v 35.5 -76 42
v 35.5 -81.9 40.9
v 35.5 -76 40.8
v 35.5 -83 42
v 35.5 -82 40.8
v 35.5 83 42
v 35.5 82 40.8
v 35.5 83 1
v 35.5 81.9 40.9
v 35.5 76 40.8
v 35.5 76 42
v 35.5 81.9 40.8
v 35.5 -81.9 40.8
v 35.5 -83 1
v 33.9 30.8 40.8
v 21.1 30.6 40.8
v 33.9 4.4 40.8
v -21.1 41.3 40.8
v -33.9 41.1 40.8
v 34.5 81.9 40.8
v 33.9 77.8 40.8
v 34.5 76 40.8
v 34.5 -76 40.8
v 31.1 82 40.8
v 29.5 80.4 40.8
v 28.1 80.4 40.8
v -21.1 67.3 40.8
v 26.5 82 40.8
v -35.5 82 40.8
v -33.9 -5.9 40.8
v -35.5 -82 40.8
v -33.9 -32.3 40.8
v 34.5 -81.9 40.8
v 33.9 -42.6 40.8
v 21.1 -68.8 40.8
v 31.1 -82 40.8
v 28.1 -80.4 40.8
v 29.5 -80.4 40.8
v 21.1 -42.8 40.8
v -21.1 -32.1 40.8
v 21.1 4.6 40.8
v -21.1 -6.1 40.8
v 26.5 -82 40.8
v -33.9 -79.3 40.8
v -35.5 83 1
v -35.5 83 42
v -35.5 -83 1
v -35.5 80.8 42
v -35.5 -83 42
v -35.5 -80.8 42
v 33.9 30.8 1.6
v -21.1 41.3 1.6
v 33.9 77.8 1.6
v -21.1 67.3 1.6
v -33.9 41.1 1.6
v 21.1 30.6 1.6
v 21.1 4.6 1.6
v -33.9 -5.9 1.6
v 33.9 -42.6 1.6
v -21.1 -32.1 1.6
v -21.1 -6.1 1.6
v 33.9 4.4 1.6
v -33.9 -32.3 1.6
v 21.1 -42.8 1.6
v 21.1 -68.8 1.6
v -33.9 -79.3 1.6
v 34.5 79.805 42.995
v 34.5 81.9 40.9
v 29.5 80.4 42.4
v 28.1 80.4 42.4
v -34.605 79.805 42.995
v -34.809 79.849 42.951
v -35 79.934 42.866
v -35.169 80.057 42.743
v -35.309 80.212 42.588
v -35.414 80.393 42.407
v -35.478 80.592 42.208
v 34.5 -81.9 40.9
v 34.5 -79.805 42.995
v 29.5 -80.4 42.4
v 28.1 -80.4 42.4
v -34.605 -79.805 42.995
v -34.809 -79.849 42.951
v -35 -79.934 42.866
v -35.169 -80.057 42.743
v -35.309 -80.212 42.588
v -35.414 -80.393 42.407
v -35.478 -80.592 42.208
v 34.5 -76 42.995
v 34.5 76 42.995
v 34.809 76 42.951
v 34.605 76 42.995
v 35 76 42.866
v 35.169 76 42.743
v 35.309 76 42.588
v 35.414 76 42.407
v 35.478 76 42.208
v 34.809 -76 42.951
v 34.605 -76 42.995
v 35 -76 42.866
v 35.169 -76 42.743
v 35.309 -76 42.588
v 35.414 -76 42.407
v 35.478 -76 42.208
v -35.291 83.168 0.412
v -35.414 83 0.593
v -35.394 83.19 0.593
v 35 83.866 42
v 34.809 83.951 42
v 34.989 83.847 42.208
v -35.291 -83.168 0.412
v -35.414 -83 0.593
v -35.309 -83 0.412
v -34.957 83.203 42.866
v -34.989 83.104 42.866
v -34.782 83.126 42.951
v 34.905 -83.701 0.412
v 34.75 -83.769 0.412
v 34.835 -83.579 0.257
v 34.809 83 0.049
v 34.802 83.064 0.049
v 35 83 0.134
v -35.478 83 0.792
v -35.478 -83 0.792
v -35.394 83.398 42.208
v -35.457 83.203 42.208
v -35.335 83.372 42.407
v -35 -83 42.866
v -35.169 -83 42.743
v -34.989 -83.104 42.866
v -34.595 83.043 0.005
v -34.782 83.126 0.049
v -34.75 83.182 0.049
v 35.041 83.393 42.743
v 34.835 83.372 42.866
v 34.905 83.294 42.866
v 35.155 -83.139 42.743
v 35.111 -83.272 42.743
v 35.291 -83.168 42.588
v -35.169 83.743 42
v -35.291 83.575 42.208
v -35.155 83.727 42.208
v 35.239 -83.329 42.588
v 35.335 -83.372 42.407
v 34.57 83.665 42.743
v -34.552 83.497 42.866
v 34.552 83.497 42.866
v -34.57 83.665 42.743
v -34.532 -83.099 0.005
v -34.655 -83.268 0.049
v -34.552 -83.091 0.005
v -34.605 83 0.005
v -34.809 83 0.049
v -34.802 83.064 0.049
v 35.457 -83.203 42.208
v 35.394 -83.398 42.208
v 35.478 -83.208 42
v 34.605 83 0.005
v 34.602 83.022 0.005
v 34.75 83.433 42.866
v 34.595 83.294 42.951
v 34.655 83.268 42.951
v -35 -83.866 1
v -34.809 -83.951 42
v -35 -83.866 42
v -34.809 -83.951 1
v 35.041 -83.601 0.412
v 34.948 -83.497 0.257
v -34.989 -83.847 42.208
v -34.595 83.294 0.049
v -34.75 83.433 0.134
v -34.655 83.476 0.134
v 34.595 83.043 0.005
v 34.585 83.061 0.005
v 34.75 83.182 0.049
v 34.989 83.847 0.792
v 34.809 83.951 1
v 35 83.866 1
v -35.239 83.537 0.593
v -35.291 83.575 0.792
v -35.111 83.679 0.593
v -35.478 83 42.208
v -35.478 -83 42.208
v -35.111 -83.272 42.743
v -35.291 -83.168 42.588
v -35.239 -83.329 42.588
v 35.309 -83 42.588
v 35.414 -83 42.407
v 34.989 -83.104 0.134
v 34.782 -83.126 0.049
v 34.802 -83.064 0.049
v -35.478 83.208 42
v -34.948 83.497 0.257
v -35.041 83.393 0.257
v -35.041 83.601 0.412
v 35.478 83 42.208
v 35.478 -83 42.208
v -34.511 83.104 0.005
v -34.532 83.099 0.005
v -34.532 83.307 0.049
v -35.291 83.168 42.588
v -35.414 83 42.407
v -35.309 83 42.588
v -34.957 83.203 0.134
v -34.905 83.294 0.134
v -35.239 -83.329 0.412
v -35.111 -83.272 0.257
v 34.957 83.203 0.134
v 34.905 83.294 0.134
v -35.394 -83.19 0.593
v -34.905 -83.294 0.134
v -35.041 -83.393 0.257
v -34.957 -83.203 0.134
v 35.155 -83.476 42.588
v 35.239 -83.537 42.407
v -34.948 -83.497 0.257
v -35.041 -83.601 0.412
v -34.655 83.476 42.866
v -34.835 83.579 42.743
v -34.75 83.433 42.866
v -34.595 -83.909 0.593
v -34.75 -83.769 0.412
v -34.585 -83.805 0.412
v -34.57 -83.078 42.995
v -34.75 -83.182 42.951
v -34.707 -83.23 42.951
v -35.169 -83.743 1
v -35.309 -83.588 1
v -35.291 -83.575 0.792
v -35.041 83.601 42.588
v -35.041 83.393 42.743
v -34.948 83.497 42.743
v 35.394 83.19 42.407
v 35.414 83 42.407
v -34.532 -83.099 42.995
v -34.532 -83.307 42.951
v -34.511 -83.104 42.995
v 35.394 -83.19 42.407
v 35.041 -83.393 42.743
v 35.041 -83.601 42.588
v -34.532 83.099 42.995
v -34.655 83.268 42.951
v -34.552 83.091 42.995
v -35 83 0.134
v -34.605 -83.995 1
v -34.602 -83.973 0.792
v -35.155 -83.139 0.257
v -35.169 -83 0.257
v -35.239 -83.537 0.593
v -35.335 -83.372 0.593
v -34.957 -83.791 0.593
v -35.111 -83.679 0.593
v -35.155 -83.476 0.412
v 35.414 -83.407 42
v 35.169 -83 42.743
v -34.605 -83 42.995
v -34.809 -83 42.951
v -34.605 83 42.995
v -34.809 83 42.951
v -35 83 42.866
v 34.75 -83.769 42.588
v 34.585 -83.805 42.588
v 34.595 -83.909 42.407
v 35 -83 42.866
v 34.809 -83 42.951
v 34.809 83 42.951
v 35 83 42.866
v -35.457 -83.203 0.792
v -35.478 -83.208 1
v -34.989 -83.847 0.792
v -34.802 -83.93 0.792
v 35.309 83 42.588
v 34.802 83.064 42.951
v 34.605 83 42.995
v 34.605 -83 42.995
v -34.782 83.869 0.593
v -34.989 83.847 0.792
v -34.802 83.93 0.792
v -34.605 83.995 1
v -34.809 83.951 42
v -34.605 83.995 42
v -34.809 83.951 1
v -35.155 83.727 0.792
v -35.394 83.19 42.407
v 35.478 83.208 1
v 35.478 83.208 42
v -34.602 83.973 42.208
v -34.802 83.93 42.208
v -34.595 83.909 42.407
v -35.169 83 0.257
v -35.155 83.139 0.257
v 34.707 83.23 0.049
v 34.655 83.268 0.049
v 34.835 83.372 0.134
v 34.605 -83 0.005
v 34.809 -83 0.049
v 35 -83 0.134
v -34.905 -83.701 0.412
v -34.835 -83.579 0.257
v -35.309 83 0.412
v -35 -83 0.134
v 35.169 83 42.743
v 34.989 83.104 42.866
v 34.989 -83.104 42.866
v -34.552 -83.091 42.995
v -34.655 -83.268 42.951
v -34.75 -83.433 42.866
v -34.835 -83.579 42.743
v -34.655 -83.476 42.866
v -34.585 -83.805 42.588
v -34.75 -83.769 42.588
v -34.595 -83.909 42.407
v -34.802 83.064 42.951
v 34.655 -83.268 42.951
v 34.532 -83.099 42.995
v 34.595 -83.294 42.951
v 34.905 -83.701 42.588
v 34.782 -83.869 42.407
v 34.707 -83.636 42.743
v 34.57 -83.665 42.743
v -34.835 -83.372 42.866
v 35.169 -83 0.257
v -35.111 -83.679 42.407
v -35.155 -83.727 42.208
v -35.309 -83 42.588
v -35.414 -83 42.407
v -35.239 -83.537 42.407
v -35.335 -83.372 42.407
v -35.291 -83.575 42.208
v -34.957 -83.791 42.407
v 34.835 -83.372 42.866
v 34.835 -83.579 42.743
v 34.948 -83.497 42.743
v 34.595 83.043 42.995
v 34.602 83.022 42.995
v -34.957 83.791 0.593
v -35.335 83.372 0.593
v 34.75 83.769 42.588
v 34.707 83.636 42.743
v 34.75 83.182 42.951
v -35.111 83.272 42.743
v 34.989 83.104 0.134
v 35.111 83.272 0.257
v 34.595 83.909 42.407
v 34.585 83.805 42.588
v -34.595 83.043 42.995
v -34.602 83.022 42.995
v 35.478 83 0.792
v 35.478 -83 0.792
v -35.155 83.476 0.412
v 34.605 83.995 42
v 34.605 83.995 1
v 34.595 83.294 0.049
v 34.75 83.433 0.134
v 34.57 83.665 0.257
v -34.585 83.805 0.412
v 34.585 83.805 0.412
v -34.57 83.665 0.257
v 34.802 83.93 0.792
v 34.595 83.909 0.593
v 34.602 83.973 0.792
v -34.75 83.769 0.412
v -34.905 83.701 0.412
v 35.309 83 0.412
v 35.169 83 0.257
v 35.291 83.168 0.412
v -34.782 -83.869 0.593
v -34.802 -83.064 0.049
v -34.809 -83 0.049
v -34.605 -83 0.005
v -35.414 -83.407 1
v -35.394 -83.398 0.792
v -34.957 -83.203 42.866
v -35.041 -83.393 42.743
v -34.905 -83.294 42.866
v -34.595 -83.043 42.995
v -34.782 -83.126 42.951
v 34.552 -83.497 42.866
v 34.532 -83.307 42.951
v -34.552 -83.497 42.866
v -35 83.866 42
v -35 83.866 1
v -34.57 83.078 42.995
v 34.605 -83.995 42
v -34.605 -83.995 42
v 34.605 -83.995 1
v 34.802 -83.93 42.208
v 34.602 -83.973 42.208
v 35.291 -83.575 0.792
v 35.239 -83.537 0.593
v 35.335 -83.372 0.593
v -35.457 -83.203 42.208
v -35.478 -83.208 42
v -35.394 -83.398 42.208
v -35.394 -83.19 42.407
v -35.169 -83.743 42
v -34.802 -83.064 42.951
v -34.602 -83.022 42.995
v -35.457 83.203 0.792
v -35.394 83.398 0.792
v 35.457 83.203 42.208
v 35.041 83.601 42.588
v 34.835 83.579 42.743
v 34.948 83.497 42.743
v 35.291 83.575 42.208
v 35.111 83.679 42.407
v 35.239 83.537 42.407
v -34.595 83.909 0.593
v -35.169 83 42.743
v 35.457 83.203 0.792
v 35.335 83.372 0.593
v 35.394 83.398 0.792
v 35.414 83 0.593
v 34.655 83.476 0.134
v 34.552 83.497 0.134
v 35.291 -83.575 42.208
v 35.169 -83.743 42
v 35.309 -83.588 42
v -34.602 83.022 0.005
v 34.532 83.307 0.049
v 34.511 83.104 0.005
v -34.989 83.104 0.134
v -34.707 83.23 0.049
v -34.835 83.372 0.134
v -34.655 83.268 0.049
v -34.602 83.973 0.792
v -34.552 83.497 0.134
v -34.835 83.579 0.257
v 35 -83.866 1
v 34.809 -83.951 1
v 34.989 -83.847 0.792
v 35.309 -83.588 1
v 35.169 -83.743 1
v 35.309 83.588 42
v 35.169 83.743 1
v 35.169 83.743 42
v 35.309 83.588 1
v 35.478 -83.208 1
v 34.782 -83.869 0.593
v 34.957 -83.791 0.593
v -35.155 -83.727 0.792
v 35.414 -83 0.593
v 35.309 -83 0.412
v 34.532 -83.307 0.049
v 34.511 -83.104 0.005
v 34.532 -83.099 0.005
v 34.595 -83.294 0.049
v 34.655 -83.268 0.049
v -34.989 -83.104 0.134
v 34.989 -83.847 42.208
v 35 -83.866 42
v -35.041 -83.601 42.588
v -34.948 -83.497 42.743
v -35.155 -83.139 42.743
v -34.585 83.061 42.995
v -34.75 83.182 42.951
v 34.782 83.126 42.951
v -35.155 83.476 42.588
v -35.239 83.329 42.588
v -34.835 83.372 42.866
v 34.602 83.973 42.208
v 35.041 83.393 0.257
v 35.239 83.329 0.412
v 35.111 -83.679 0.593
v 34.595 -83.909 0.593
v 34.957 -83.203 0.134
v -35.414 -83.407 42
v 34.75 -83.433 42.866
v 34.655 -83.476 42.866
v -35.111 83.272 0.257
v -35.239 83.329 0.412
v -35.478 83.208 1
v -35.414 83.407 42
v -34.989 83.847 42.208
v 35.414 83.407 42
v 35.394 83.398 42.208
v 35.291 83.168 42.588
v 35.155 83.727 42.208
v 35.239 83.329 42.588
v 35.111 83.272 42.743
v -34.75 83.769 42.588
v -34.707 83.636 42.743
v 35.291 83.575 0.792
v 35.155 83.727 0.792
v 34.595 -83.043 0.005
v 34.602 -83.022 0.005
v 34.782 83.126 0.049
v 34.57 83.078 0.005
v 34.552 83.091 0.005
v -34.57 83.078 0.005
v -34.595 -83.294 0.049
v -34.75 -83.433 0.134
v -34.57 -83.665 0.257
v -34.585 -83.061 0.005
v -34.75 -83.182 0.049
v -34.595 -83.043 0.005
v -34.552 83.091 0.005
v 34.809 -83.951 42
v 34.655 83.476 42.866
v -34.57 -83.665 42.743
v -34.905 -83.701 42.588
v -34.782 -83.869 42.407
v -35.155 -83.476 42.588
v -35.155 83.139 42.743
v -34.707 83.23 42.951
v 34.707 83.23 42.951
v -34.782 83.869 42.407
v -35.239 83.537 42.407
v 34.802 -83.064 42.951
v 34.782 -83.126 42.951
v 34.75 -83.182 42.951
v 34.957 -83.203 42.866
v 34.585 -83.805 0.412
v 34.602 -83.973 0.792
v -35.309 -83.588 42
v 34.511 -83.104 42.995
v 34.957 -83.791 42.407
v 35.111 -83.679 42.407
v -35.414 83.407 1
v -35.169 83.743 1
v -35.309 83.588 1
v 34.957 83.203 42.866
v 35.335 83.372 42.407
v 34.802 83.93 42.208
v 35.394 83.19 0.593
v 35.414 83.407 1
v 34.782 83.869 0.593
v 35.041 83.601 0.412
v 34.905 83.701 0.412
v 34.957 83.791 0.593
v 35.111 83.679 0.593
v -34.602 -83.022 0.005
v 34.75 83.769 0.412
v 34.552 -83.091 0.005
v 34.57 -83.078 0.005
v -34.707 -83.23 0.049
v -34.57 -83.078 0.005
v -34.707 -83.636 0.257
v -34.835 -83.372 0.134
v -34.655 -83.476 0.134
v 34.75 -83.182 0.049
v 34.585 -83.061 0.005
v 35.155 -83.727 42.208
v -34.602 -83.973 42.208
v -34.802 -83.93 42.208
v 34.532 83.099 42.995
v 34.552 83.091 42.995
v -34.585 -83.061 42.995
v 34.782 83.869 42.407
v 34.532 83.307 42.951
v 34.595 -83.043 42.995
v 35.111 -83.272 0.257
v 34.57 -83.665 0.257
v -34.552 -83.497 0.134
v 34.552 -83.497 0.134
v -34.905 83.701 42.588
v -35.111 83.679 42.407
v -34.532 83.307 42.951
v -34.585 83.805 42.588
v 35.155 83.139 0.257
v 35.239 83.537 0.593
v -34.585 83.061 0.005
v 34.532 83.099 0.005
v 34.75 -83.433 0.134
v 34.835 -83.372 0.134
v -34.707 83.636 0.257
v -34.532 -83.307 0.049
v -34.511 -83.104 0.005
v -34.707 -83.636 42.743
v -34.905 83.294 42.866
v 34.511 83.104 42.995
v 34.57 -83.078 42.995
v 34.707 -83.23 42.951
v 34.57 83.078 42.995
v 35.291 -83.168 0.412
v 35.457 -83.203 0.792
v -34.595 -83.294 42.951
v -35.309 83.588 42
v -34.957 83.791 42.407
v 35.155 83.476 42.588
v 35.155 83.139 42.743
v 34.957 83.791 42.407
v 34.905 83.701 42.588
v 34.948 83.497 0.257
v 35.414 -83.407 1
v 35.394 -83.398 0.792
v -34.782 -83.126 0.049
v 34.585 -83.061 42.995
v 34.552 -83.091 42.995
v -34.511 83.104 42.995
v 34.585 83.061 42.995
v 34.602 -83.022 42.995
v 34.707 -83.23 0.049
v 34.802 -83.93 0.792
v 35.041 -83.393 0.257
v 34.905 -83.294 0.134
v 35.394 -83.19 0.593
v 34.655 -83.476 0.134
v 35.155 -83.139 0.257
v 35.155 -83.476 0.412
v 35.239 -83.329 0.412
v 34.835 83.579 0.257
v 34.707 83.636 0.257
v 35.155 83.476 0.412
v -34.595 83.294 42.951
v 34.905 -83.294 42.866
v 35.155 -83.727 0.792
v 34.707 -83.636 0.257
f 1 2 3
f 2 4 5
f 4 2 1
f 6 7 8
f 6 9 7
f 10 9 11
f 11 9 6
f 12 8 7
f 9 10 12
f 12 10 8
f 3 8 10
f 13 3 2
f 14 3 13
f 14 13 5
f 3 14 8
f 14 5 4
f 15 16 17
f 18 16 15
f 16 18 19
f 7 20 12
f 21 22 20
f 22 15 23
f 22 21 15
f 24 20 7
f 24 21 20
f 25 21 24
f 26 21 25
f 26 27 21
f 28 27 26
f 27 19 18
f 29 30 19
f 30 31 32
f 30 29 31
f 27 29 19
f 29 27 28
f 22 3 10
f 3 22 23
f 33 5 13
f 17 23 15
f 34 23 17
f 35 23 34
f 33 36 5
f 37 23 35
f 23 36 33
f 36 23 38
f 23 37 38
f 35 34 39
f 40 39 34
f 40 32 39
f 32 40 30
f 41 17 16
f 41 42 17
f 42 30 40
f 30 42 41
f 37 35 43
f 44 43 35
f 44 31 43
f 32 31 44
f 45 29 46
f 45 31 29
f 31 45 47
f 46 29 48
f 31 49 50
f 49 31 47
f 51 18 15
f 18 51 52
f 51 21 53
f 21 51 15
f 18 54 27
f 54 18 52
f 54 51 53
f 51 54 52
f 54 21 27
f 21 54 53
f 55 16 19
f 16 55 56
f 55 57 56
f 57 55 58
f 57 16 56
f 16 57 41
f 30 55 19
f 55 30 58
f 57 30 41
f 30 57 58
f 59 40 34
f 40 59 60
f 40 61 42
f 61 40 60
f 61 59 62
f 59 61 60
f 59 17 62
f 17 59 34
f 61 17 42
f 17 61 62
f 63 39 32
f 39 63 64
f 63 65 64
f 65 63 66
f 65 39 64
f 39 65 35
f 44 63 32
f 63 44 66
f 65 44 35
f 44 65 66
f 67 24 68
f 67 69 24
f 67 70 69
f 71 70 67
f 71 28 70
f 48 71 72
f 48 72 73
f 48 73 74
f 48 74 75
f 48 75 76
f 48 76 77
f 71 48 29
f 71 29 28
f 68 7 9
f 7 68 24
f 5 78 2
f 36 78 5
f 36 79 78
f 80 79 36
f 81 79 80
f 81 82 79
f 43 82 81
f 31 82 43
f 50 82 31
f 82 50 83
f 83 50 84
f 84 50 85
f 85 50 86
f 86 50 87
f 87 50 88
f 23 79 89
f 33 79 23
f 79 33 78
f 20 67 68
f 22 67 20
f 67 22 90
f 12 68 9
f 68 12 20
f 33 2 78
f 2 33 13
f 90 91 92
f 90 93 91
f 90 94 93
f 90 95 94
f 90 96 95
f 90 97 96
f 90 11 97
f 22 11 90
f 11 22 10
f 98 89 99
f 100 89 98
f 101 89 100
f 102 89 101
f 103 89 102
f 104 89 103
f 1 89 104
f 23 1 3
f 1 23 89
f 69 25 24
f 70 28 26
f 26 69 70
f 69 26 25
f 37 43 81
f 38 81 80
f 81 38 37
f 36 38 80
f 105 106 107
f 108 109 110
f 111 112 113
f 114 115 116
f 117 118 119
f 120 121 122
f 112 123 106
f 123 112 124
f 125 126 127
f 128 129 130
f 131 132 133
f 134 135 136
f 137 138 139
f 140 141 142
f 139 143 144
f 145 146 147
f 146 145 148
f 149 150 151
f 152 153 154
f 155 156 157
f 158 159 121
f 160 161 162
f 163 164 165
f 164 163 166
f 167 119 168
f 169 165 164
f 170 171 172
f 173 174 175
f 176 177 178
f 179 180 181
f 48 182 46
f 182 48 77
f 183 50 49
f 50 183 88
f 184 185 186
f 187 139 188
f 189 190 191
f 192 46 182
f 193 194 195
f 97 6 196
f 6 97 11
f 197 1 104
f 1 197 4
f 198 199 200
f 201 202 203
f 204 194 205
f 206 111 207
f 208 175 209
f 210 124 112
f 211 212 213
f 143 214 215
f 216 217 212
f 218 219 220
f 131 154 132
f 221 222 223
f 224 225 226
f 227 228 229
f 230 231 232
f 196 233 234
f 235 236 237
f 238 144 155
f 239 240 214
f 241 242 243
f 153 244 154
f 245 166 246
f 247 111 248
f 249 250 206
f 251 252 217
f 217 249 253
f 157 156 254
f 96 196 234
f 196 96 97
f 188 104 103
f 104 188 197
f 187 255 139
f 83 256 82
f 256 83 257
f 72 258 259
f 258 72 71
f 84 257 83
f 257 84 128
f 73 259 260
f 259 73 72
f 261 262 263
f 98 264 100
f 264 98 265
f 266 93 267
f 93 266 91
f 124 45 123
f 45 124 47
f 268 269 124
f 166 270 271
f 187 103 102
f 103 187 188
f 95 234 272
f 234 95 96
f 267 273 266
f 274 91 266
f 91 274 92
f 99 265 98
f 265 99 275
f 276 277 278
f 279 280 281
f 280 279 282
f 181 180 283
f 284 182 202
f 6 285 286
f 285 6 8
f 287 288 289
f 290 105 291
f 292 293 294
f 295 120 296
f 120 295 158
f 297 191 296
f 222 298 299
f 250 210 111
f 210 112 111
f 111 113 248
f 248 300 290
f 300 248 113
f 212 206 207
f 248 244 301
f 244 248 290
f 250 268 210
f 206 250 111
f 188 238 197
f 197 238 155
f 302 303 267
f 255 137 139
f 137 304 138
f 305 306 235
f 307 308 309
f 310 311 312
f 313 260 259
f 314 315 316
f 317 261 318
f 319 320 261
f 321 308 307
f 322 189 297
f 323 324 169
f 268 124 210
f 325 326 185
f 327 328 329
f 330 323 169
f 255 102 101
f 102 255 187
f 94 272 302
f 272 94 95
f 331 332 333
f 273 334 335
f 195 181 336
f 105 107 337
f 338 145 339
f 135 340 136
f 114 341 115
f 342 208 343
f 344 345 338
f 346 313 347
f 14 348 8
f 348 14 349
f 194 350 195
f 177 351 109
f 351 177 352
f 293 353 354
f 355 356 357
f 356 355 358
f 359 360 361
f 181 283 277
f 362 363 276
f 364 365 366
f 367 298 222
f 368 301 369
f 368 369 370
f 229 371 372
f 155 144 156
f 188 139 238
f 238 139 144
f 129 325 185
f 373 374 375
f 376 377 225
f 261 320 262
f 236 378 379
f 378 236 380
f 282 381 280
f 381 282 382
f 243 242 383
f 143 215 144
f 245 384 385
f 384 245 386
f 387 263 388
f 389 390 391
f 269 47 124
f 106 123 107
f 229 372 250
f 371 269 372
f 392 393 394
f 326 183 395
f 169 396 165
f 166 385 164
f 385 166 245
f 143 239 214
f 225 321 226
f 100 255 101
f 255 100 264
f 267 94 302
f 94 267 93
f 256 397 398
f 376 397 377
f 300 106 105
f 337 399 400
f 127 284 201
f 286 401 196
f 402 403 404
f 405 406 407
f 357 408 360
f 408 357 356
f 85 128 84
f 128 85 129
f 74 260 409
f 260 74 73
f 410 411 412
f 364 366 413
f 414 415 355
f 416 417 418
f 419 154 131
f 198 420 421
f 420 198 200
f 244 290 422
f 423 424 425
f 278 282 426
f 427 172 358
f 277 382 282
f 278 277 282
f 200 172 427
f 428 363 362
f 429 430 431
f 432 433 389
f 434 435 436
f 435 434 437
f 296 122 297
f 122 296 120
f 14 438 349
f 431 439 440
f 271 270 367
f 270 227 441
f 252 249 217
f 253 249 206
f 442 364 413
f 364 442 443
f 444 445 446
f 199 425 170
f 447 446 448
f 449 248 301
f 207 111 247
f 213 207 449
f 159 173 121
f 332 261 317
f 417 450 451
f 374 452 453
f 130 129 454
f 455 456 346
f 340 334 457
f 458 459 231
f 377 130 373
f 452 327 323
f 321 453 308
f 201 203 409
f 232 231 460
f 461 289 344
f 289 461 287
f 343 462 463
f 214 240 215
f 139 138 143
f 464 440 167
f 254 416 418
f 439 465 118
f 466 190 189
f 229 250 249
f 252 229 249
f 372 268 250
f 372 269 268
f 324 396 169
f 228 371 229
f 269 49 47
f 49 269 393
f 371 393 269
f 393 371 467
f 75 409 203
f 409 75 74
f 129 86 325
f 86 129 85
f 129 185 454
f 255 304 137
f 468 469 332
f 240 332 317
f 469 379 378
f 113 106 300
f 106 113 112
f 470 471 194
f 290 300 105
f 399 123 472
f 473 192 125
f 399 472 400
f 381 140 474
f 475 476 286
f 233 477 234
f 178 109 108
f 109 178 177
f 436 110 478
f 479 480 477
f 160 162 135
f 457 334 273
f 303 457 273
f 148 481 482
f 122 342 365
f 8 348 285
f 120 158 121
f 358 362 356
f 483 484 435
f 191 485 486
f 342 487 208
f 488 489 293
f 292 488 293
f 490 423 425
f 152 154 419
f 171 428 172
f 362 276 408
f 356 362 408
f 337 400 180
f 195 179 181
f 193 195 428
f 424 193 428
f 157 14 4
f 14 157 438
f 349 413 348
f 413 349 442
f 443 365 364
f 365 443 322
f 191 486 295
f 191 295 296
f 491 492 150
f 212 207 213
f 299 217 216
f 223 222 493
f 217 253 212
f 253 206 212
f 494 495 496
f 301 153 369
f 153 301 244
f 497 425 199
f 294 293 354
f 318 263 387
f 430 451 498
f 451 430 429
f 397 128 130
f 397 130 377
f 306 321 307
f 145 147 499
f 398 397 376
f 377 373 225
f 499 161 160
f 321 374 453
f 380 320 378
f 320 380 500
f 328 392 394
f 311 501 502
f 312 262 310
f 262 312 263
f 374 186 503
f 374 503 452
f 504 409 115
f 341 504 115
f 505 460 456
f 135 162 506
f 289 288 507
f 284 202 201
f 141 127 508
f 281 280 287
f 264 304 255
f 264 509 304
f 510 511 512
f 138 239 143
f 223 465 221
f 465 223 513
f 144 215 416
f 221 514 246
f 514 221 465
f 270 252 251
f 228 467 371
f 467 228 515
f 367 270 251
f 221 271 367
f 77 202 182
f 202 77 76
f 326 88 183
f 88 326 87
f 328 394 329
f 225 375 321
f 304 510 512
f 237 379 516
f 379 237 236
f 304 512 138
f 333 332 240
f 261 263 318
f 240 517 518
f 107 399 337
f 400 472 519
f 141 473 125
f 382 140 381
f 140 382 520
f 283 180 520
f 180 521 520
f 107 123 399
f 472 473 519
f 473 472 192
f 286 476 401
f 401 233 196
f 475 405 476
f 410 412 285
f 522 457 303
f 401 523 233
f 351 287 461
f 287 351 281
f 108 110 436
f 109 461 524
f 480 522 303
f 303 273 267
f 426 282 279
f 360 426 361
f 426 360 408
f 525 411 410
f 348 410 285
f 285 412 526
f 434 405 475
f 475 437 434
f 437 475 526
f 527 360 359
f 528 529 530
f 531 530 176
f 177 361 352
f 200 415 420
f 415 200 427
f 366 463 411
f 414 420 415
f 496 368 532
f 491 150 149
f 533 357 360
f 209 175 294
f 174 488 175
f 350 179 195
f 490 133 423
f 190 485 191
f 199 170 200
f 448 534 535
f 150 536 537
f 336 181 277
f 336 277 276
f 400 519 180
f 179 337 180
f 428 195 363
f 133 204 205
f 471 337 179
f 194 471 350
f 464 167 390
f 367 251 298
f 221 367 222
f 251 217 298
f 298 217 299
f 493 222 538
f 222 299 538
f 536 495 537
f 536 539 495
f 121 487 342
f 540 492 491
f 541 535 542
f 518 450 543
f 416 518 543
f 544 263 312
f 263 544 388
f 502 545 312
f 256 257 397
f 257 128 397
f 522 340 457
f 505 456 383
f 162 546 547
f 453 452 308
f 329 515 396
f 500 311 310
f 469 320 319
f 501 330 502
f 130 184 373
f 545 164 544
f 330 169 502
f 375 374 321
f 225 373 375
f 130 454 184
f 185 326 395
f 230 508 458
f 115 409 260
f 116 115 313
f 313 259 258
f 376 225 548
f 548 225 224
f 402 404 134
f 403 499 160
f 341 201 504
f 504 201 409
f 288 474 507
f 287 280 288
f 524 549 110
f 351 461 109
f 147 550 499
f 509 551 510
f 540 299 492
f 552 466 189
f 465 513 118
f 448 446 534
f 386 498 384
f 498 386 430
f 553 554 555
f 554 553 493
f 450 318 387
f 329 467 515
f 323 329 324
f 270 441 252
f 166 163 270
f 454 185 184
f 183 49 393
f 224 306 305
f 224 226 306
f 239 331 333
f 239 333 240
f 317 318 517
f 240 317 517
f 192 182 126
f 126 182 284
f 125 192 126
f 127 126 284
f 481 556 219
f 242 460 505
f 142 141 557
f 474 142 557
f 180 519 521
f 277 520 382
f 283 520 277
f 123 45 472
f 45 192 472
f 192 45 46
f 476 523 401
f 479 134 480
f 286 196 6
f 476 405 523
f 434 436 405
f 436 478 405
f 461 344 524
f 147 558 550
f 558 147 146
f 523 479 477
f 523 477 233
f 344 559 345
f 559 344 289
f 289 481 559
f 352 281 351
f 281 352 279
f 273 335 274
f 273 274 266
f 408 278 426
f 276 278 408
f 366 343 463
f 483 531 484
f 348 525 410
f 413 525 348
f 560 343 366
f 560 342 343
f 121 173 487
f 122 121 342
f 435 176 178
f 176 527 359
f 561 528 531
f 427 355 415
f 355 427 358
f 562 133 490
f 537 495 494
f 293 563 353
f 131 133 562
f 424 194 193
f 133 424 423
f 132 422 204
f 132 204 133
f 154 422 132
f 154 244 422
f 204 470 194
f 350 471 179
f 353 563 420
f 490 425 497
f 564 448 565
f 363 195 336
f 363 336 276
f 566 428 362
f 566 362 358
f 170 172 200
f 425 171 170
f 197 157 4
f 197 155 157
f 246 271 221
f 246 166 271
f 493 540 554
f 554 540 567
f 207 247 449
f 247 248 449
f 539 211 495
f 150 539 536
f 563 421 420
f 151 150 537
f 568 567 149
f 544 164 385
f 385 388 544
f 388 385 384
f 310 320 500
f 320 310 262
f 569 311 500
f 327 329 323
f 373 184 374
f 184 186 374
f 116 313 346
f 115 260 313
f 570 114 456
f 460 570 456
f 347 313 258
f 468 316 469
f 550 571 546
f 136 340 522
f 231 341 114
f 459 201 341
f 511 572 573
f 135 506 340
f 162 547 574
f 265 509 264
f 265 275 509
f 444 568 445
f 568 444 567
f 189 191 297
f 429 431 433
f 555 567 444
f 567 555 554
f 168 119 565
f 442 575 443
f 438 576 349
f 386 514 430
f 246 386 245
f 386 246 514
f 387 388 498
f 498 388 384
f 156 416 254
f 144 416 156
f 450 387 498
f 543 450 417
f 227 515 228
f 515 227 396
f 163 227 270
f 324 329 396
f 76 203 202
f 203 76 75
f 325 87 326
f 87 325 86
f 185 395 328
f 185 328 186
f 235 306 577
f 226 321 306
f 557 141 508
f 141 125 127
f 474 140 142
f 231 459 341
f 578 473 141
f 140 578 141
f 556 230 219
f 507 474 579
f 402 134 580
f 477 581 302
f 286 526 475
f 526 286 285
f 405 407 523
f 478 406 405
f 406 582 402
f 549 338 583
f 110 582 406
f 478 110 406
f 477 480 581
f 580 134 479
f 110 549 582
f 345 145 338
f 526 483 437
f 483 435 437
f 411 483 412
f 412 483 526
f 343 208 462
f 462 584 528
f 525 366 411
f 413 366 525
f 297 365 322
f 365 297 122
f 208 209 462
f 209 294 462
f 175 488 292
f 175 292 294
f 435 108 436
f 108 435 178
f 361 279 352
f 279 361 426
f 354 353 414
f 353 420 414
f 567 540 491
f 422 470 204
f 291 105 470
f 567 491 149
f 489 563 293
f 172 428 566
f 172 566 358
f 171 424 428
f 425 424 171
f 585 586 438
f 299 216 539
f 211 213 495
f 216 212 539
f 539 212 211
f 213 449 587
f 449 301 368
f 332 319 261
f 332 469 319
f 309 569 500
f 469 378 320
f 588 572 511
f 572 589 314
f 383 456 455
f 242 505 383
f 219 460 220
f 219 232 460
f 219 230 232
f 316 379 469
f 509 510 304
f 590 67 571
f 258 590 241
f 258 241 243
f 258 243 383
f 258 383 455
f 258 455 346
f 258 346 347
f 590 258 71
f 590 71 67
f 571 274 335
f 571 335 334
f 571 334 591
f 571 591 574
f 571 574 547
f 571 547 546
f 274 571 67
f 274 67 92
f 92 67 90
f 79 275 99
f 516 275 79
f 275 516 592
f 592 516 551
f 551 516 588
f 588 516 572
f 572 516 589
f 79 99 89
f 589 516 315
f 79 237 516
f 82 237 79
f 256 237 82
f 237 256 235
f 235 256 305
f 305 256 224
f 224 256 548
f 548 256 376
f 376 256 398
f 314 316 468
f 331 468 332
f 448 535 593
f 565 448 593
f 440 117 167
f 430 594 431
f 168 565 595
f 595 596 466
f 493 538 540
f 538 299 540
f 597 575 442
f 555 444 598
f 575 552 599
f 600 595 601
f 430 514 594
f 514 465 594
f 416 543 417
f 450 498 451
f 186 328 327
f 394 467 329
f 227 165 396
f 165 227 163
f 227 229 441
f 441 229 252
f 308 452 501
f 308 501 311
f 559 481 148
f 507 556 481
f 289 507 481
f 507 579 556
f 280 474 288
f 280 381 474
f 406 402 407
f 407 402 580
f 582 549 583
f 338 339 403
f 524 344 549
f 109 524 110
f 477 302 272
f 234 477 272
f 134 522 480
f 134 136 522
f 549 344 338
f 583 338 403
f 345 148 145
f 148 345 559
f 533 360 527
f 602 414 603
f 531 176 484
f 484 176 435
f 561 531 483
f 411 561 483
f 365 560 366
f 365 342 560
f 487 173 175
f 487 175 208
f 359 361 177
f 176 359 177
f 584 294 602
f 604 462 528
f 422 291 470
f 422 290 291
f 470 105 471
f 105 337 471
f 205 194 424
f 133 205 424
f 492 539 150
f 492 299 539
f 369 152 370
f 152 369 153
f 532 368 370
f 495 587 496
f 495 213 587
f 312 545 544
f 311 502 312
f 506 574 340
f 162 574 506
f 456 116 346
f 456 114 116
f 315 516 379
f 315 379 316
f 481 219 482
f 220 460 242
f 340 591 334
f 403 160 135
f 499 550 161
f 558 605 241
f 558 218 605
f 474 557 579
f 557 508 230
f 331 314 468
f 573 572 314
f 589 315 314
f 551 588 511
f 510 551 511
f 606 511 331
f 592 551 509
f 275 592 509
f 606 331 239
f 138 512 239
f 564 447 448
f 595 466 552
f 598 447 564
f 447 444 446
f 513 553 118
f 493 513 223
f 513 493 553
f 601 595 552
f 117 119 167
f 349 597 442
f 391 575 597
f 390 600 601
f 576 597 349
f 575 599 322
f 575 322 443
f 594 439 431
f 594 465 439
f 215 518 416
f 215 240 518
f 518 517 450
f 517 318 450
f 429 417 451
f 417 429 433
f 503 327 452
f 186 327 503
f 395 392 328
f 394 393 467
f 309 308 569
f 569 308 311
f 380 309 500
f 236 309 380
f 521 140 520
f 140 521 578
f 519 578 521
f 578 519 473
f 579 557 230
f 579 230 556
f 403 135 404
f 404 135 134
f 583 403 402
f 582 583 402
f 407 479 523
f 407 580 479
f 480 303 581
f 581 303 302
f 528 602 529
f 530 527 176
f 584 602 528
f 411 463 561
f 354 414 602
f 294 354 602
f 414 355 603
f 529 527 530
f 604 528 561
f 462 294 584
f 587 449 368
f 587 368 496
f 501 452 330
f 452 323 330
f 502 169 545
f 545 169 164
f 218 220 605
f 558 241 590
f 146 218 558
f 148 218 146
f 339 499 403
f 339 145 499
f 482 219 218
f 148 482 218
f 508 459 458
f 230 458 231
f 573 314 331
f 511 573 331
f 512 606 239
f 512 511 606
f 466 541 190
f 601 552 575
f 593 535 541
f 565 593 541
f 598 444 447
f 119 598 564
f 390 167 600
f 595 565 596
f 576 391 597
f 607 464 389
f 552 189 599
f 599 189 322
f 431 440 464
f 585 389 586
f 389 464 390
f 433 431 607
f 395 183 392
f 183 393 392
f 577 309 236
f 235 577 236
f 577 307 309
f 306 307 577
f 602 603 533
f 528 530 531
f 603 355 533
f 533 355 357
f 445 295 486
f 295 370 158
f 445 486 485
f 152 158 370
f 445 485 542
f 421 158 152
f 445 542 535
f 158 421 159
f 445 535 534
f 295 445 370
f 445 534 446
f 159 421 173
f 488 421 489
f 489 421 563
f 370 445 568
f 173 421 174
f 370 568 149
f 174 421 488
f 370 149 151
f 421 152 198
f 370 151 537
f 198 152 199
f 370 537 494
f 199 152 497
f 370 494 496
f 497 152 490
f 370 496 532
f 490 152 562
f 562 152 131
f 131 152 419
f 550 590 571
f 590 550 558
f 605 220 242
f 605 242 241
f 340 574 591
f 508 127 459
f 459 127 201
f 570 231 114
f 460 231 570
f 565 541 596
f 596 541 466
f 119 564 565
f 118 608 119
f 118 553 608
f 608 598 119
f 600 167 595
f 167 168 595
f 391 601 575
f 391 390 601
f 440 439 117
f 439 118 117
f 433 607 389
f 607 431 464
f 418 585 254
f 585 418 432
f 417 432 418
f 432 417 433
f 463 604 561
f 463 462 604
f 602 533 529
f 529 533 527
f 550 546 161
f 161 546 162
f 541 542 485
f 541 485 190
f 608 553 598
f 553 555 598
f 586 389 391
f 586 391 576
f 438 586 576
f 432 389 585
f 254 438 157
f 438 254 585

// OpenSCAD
$fn=30;

/* [Global] */

// Render
Objects = "Box"; //  [Both, Box, Lid]
// Type of lid pattern
gPattern = "Diamond"; //  [Hex, Diamond, Solid, Fancy]
// Tolerance
gTol = 0.2;
// Wall Thickness
gWT = 1.6;

//  padded mini 8 in x, and 2 in y  to give it a lip
CastleX = 55;
CastleY1 = 26;
CastleY2 = 47;

MiniX = 66;
MiniY =60;

SepBuffer = 13.2;

// Add Cylinder to each bucket for access
StdAccess = 1;
BinRounding = 1;

/* [Spider Web] */
// Amount of space from one ring or webs to the next
WebSpacing = 10;
// How many rings of webs, best of more than needed
WebStrands = 5;
// Thickness of the strands
WedThickness = 1.8;
// How many segments of web
WebWedges = 12;


/* [Hidden] */
/* Private variables */

// Box Height
RailGrip = 2.0;
RailOpeningX = 2.2;
RailWidth = RailGrip+RailOpeningX;
LidH = 2.2;
NubWidth = 1.4;
NubSize = 1.6;
NubPos = 6;
SpringOpening = 2.0;
SpringLength = 13;

function SumList(list, start, end) = (start == end) ? 0 : list[start] + SumList(list, start+1, end);

// Box Length
TotalX = 71;
// Box Width 10 mm pad between skill and level for finger slot
TotalY = 168;
TotalZ = 43;

echo("Size: ",TotalX,TotalY, TotalZ);
   
// Height not counting the lid
AdjBoxHeight = TotalZ - LidH;

 module regular_polygon(order, r=1){
 	angles=[ for (i = [0:order-1]) i*(360/order) ];
 	coords=[ for (th=angles) [r*cos(th), r*sin(th)] ];
 	polygon(coords);
 }

 module trap_pyramid(base, top, h){
    polygon(points=[[-h/2,-base/2],
                    [h/2,-top/2],
                    [h/2,top/2],
                    [-h/2,base/2]]);
 }

module diamond_lattice(ipX, ipY, DSize, WSize)  {

    lOffset = DSize + WSize;

	difference()  {
		square([ipX, ipY]);
		for (x=[0:lOffset:ipX]) {
            for (y=[0:lOffset:ipY]){
  			   translate([x, y])  regular_polygon(4, r=DSize/2);
			   translate([x+lOffset/2, y+lOffset/2]) regular_polygon(4, r=DSize/2);
		    }
        }        
	}
}

module circle_lattice(ipX, ipY, Spacing=10, Walls=1.2)  {


   intersection() {
      square([ipX,ipY]); 
      union() {
	    for (x=[-Spacing:Spacing:ipX+Spacing]) {
           for (y=[-Spacing:Spacing:ipY+Spacing]){
	          difference()  {
			     translate([x+Spacing/2, y+Spacing/2]) circle(r=Spacing*0.75);
			     translate([x+Spacing/2, y+Spacing/2]) circle(r=(Spacing*0.75)-Walls);
		      }
           }   // end for y        
	    }  // end for x
      } // End union
   }
}

module football() {
    scale([0.7,0.7])
    intersection(){
        translate([-4,0]) circle(6);
        translate([4,0]) circle(6);
    }
}

module RCube(x,y,z,ipR=4) {
    translate([-x/2,-y/2,0]) hull(){
      translate([ipR,ipR,ipR]) sphere(ipR);
      translate([x-ipR,ipR,ipR]) sphere(ipR);
      translate([ipR,y-ipR,ipR]) sphere(ipR);
      translate([x-ipR,y-ipR,ipR]) sphere(ipR);
      translate([ipR,ipR,z-ipR]) sphere(ipR);
      translate([x-ipR,ipR,z-ipR]) sphere(ipR);
      translate([ipR,y-ipR,z-ipR]) sphere(ipR);
      translate([x-ipR,y-ipR,z-ipR]) sphere(ipR);
      }  
} 

module lid(ipPattern = "Hex", ipTol = 0.3){
  lAdjX = TotalX;
  lAdjY = TotalY-RailWidth*2-ipTol*2;  
  lAdjZ = LidH;
  CutX = lAdjX - 8;
  CutY = lAdjY - 8;
  lFingerX = 15;
  lFingerY = 16;  

  // main square with center removed for a pattern. 0.01 addition is a kludge to avoid a 2d surface remainging when substracting the lid from the box.
         difference() {
      translate([0,0,lAdjZ/2]) cube([lAdjX+0.01, lAdjY+0.01 , lAdjZ], center=true);

      translate([0,0,lAdjZ/2]) cube([CutX, CutY, lAdjZ], center = true);
      translate([TotalX/2-gWT/2,0,LidH/2])cube([gWT+0.01,TotalY-RailWidth,LidH],center=true);

     // make a slot for the latch can flex         
     translate([TotalX/2-SpringLength/2,TotalY/2-RailWidth-SpringOpening/2-1,-1]) RCube(SpringLength,SpringOpening,4,0.4);
     translate([TotalX/2-SpringLength/2,-TotalY/2+RailWidth+SpringOpening/2+1,-1]) RCube(SpringLength,SpringOpening,4,0.4);
             
 //            SpringOpening = 2.2;
//SpringLength = 20;
             
  }
  
  // The Side triangles
  difference() {
    intersection () {
      union () {
            translate([-TotalX/2,TotalY/2-RailWidth-gTol,0]) rotate([0,90,0]) 
                  linear_extrude(TotalX-1-gTol) polygon(points=[
                            [0,0],
                            [0,LidH],
                            [-RailOpeningX,0]]);
            translate([-TotalX/2,-TotalY/2+RailWidth+gTol,0]) 
                rotate([0,90,0]) 
                linear_extrude(TotalX-1-gTol) 
                polygon(points=[
                            [0,0],
                            [0,-LidH],
                            [-RailOpeningX,0]]);
              }
    }
       
        // cut notches into the railings
    translate([TotalX/2-(NubWidth+2*NubSize/2)-NubPos,TotalY/2-RailWidth+NubSize+gTol,0])
        hull(){
            translate([0,0]) cylinder(h=LidH, r = 0.2);
            translate([NubWidth+2*NubSize,0]) cylinder(h=LidH, r = 0.2);
            translate([NubWidth+NubSize,-NubSize]) cylinder(h=LidH, r = 0.2);
            translate([NubSize,-NubSize]) cylinder(h=LidH, r = 0.2);
        }


    translate([TotalX/2-(NubWidth+2*NubSize/2)-NubPos,-TotalY/2+RailWidth-NubSize-gTol,0])
         hull(){
            translate([0,0]) cylinder(h=LidH, r = 0.2);
            translate([NubWidth+2*NubSize,0]) cylinder(h=LidH, r = 0.2);
            translate([NubWidth+NubSize,NubSize]) cylinder(h=LidH, r = 0.2);
            translate([NubSize,NubSize]) cylinder(h=LidH, r = 0.2);
        }       
        
       // trim a little off the railing past the nub  TODO fix to new vars
        translate([TotalX/2,TotalY/2-LidH/2-ipTol,0]) cube([12,LidH,LidH*2],center=true); 
        translate([TotalX/2,-TotalY/2+LidH/2+ipTol,0]) cube([12,LidH,LidH*2],center=true); 
    
  }
 
  // Finger slot
  difference () {
      translate([-CutX/2,-lFingerY/2,0]) cube([lFingerX, lFingerY, lAdjZ]); 
      translate([-CutX/2+lFingerX/2,0,20+LidH/2])sphere(20);     
  }


  // Solid top
  if (ipPattern == "Solid") 
      {   
       difference (){ 
         translate([-CutX/2,-CutY/2,0]) cube([CutX, CutY,   lAdjZ]);
         translate([-CutX/2,-lFingerY/2,0]) cube([lFingerX, lFingerY, lAdjZ]); 
      }
    }
    

  // Spiderweb top
  if (ipPattern == "Web") 
    {
       difference (){ 
         intersection () 
        {    
             linear_extrude(height = lAdjZ) spider_web(WebSpacing, WebStrands, WedThickness, WebWedges);  
              translate([-CutX/2,-CutY/2,0]) cube([CutX, CutY, LidH*2]); 
        }
         translate([-CutX/2,-lFingerY/2,0]) cube([lFingerX, lFingerY, lAdjZ]); 
      }
    }

  // Hex top
  if (ipPattern == "Hex") 
    {   
       difference (){ 
         translate([-CutX/2,-CutY/2,0]) linear_extrude(height = lAdjZ) hex_lattice(CutX,CutY,6,2);
         translate([-CutX/2,-lFingerY/2,0]) cube([lFingerX, lFingerY, lAdjZ]); 
      }
    }

  // Diamond top
  if (ipPattern == "Diamond") 
    {
      difference (){ 
        translate([-CutX/2,-CutY/2,0]) linear_extrude(height = lAdjZ) diamond_lattice(CutX,CutY,7,2);
        translate([-CutX/2,-lFingerY/2,0]) cube([lFingerX, lFingerY, lAdjZ]); 
      }
    }

  // fancy top
  if (ipPattern == "Fancy") 
    {
        echo(CutX,CutY);
      difference (){ 
        translate([-CutX/2,-CutY/2,0]) linear_extrude(height = lAdjZ) circle_lattice(CutX,CutY);
        translate([-CutX/2,-lFingerY/2,0]) cube([lFingerX, lFingerY, lAdjZ]); 
      }
    }

  // Leaf top
  if (ipPattern == "Leaf") 
    {   
       difference (){ 
         translate([-CutX/2,-CutY/2,0]) linear_extrude(height = lAdjZ) leaf_lattice(CutX,CutY,4,2);
         translate([-CutX/2,-lFingerY/2,0]) cube([lFingerX, lFingerY, lAdjZ]); 
      }
    }
}



module box () {
//  Main Box
    
  difference() {   
     union(){
        // main box 
        translate ([0,0,AdjBoxHeight/2]) cube([TotalX,TotalY,AdjBoxHeight], center = true);
        // add backstop
        translate([TotalX/2-1/2,0,TotalZ-LidH/2])cube([1,TotalY-RailWidth,LidH],center=true);
     }

    // limit backdrop
//     translate([TotalX/2,0,AdjBoxHeight+5])cube([4,TotalY-16,10],center=true);

    // Scope out castle areas
    CastleSpacing = CastleY2/2 + SepBuffer;
     
    translate([TotalX/2-CastleX/2-gWT,TotalY/2+7-CastleSpacing,gWT])  linear_extrude(TotalZ) rotate([0,0,180]) trap_pyramid(CastleY2, CastleY1, CastleX);
         
    translate([-TotalX/2+CastleX/2+gWT,TotalY/2+7-CastleSpacing*2,gWT])  linear_extrude(TotalZ) trap_pyramid(CastleY2, CastleY1, CastleX);   
    
    translate([TotalX/2-CastleX/2-gWT,TotalY/2+7-CastleSpacing*3,gWT]) linear_extrude(100) rotate([0,0,180]) trap_pyramid(CastleY2, CastleY1, CastleX); 
     
    translate([-TotalX/2+CastleX/2+gWT,TotalY/2+7-CastleSpacing*4,gWT]) linear_extrude(100)  trap_pyramid(CastleY2, CastleY1, CastleX);
     
 //   translate([+TotalX/2-MiniX/2-gWT,-TotalY/2+MiniY/2+RailWidth,gWT]) RCube(MiniX,MiniY,TotalZ);
     

  }




  // top rails
  difference() {
      union() {
          translate([0,-TotalY/2+RailWidth/2,AdjBoxHeight+LidH/2]) cube([TotalX,RailWidth,LidH],center = true);  
          translate([0,TotalY/2-RailWidth/2,AdjBoxHeight+LidH/2]) cube([TotalX,RailWidth,LidH],center = true);
           }
       
      // Trim each rail top to a 45 degree angle     
      translate([0,-TotalY/2,AdjBoxHeight+RailWidth]) rotate([45,0,0]) cube([TotalX,RailWidth+0.7,RailWidth+0.7], center=true); 
      translate([0,TotalY/2,AdjBoxHeight+RailWidth])  rotate([45,0,0]) cube([TotalX,RailWidth+0.7,RailWidth+0.7], center=true);  

      // Substract the lid from the rails
      translate([0,0,AdjBoxHeight]) lid(ipPattern = "Solid",ipTol =0);      
  }  
  

  
  // create the latches 
    translate([TotalX/2-7,TotalY/2-0.1-RailWidth/2,TotalZ-LidH/2]) scale([1.5,1,1]) difference(){
      rotate([0,0,45]) cube ([2,2,LidH+1],center=true);
      translate([0,2,0]) cube ([4,4,LidH+2],center=true);
      translate([0,-2,0])cube([2,2,LidH+2], center=true);
      }  
    translate([TotalX/2-7,-TotalY/2+0.1+RailWidth/2,TotalZ-LidH/2]) scale([1.5,1,1]) difference(){
      rotate([0,0,45]) cube ([2,2,LidH+1],center=true);
      translate([0,-2,0]) cube ([4,4,LidH+2],center=true);
      translate([0,2,0])cube([2,2,LidH+2], center=true);
      }

  
} 

module box () {
//  Main Box
  difference() {    
    translate ([0,0,AdjBoxHeight/2]) cube([TotalX,TotalY,AdjBoxHeight], center = true);

    // Scope out castle areas
    CastleSpacing = CastleY2/2 + SepBuffer;
     
    translate([TotalX/2-CastleX/2-gWT,TotalY/2+7-CastleSpacing,gWT])  linear_extrude(TotalZ) rotate([0,0,180]) trap_pyramid(CastleY2, CastleY1, CastleX);
         
    translate([-TotalX/2+CastleX/2+gWT,TotalY/2+7-CastleSpacing*2,gWT])  linear_extrude(TotalZ) trap_pyramid(CastleY2, CastleY1, CastleX);   
    
    translate([TotalX/2-CastleX/2-gWT,TotalY/2+7-CastleSpacing*3,gWT]) linear_extrude(100) rotate([0,0,180]) trap_pyramid(CastleY2, CastleY1, CastleX); 
     
    translate([-TotalX/2+CastleX/2+gWT,TotalY/2+7-CastleSpacing*4,gWT]) linear_extrude(100)  trap_pyramid(CastleY2, CastleY1, CastleX);
  }

// Left rail
    difference(){
    translate([0,TotalY/2-RailWidth/2,TotalZ-LidH/2])cube([TotalX, RailWidth, LidH], center=true);
    translate([-TotalX/2,TotalY/2-RailWidth,TotalZ-LidH]) rotate([0,90,0]) linear_extrude(TotalX) polygon(points=[
                    [0,0],
                    [0,LidH],
                    [-RailOpeningX,0]]);
    }
     
// right Rail      
    difference(){
    translate([0,-TotalY/2+RailWidth/2,TotalZ-LidH/2])cube([TotalX, RailWidth, LidH], center=true);
    translate([-TotalX/2,-TotalY/2+RailWidth,TotalZ-LidH]) 
        rotate([0,90,0]) 
        linear_extrude(TotalX) 
        polygon(points=[
                    [0,0],
                    [0,-LidH],
                    [-RailOpeningX,0]]);
    }      

    
   // add backstop
    difference(){
   translate([TotalX/2-1/2,0,TotalZ-LidH/2])cube([1,TotalY-RailWidth,LidH],center=true);
   translate([TotalX/2-1/2,0,TotalZ-LidH/2])cube([1,TotalY-16,LidH],center=true);

    }
  
    // create the latch nubs
    translate([TotalX/2-(NubWidth+2*NubSize/2)-NubPos,+TotalY/2-RailGrip,TotalZ-LidH])
      linear_extrude(LidH) 
         polygon([
                    [0,0],
                    [NubWidth+2*NubSize,0],
                    [NubWidth+NubSize,-NubSize],
                    [NubSize,-NubSize]], paths=[[0,1,2,3]]);

    translate([TotalX/2-(NubWidth+2*NubSize/2)-NubPos,-TotalY/2+RailGrip,TotalZ-LidH])
      linear_extrude(LidH) 
         polygon([
                    [0,0],
                    [NubWidth+2*NubSize,0],
                    [NubWidth+NubSize,NubSize],
                    [NubSize,NubSize]], paths=[[0,1,2,3]]);
} 




// Production Box
if ((Objects == "Both") || (Objects == "Box")){
 intersection() {
    box();
     RCube(TotalX,TotalY,TotalZ,1);
  }
}

// Production Lid
if (Objects == "Both"){
  translate([-TotalX - 10,0,0]) lid(ipPattern = gPattern, ipTol = gTol);
}

// Production Lid
if (Objects == "Lid"){
  lid(ipPattern = gPattern, ipTol = gTol);
}
